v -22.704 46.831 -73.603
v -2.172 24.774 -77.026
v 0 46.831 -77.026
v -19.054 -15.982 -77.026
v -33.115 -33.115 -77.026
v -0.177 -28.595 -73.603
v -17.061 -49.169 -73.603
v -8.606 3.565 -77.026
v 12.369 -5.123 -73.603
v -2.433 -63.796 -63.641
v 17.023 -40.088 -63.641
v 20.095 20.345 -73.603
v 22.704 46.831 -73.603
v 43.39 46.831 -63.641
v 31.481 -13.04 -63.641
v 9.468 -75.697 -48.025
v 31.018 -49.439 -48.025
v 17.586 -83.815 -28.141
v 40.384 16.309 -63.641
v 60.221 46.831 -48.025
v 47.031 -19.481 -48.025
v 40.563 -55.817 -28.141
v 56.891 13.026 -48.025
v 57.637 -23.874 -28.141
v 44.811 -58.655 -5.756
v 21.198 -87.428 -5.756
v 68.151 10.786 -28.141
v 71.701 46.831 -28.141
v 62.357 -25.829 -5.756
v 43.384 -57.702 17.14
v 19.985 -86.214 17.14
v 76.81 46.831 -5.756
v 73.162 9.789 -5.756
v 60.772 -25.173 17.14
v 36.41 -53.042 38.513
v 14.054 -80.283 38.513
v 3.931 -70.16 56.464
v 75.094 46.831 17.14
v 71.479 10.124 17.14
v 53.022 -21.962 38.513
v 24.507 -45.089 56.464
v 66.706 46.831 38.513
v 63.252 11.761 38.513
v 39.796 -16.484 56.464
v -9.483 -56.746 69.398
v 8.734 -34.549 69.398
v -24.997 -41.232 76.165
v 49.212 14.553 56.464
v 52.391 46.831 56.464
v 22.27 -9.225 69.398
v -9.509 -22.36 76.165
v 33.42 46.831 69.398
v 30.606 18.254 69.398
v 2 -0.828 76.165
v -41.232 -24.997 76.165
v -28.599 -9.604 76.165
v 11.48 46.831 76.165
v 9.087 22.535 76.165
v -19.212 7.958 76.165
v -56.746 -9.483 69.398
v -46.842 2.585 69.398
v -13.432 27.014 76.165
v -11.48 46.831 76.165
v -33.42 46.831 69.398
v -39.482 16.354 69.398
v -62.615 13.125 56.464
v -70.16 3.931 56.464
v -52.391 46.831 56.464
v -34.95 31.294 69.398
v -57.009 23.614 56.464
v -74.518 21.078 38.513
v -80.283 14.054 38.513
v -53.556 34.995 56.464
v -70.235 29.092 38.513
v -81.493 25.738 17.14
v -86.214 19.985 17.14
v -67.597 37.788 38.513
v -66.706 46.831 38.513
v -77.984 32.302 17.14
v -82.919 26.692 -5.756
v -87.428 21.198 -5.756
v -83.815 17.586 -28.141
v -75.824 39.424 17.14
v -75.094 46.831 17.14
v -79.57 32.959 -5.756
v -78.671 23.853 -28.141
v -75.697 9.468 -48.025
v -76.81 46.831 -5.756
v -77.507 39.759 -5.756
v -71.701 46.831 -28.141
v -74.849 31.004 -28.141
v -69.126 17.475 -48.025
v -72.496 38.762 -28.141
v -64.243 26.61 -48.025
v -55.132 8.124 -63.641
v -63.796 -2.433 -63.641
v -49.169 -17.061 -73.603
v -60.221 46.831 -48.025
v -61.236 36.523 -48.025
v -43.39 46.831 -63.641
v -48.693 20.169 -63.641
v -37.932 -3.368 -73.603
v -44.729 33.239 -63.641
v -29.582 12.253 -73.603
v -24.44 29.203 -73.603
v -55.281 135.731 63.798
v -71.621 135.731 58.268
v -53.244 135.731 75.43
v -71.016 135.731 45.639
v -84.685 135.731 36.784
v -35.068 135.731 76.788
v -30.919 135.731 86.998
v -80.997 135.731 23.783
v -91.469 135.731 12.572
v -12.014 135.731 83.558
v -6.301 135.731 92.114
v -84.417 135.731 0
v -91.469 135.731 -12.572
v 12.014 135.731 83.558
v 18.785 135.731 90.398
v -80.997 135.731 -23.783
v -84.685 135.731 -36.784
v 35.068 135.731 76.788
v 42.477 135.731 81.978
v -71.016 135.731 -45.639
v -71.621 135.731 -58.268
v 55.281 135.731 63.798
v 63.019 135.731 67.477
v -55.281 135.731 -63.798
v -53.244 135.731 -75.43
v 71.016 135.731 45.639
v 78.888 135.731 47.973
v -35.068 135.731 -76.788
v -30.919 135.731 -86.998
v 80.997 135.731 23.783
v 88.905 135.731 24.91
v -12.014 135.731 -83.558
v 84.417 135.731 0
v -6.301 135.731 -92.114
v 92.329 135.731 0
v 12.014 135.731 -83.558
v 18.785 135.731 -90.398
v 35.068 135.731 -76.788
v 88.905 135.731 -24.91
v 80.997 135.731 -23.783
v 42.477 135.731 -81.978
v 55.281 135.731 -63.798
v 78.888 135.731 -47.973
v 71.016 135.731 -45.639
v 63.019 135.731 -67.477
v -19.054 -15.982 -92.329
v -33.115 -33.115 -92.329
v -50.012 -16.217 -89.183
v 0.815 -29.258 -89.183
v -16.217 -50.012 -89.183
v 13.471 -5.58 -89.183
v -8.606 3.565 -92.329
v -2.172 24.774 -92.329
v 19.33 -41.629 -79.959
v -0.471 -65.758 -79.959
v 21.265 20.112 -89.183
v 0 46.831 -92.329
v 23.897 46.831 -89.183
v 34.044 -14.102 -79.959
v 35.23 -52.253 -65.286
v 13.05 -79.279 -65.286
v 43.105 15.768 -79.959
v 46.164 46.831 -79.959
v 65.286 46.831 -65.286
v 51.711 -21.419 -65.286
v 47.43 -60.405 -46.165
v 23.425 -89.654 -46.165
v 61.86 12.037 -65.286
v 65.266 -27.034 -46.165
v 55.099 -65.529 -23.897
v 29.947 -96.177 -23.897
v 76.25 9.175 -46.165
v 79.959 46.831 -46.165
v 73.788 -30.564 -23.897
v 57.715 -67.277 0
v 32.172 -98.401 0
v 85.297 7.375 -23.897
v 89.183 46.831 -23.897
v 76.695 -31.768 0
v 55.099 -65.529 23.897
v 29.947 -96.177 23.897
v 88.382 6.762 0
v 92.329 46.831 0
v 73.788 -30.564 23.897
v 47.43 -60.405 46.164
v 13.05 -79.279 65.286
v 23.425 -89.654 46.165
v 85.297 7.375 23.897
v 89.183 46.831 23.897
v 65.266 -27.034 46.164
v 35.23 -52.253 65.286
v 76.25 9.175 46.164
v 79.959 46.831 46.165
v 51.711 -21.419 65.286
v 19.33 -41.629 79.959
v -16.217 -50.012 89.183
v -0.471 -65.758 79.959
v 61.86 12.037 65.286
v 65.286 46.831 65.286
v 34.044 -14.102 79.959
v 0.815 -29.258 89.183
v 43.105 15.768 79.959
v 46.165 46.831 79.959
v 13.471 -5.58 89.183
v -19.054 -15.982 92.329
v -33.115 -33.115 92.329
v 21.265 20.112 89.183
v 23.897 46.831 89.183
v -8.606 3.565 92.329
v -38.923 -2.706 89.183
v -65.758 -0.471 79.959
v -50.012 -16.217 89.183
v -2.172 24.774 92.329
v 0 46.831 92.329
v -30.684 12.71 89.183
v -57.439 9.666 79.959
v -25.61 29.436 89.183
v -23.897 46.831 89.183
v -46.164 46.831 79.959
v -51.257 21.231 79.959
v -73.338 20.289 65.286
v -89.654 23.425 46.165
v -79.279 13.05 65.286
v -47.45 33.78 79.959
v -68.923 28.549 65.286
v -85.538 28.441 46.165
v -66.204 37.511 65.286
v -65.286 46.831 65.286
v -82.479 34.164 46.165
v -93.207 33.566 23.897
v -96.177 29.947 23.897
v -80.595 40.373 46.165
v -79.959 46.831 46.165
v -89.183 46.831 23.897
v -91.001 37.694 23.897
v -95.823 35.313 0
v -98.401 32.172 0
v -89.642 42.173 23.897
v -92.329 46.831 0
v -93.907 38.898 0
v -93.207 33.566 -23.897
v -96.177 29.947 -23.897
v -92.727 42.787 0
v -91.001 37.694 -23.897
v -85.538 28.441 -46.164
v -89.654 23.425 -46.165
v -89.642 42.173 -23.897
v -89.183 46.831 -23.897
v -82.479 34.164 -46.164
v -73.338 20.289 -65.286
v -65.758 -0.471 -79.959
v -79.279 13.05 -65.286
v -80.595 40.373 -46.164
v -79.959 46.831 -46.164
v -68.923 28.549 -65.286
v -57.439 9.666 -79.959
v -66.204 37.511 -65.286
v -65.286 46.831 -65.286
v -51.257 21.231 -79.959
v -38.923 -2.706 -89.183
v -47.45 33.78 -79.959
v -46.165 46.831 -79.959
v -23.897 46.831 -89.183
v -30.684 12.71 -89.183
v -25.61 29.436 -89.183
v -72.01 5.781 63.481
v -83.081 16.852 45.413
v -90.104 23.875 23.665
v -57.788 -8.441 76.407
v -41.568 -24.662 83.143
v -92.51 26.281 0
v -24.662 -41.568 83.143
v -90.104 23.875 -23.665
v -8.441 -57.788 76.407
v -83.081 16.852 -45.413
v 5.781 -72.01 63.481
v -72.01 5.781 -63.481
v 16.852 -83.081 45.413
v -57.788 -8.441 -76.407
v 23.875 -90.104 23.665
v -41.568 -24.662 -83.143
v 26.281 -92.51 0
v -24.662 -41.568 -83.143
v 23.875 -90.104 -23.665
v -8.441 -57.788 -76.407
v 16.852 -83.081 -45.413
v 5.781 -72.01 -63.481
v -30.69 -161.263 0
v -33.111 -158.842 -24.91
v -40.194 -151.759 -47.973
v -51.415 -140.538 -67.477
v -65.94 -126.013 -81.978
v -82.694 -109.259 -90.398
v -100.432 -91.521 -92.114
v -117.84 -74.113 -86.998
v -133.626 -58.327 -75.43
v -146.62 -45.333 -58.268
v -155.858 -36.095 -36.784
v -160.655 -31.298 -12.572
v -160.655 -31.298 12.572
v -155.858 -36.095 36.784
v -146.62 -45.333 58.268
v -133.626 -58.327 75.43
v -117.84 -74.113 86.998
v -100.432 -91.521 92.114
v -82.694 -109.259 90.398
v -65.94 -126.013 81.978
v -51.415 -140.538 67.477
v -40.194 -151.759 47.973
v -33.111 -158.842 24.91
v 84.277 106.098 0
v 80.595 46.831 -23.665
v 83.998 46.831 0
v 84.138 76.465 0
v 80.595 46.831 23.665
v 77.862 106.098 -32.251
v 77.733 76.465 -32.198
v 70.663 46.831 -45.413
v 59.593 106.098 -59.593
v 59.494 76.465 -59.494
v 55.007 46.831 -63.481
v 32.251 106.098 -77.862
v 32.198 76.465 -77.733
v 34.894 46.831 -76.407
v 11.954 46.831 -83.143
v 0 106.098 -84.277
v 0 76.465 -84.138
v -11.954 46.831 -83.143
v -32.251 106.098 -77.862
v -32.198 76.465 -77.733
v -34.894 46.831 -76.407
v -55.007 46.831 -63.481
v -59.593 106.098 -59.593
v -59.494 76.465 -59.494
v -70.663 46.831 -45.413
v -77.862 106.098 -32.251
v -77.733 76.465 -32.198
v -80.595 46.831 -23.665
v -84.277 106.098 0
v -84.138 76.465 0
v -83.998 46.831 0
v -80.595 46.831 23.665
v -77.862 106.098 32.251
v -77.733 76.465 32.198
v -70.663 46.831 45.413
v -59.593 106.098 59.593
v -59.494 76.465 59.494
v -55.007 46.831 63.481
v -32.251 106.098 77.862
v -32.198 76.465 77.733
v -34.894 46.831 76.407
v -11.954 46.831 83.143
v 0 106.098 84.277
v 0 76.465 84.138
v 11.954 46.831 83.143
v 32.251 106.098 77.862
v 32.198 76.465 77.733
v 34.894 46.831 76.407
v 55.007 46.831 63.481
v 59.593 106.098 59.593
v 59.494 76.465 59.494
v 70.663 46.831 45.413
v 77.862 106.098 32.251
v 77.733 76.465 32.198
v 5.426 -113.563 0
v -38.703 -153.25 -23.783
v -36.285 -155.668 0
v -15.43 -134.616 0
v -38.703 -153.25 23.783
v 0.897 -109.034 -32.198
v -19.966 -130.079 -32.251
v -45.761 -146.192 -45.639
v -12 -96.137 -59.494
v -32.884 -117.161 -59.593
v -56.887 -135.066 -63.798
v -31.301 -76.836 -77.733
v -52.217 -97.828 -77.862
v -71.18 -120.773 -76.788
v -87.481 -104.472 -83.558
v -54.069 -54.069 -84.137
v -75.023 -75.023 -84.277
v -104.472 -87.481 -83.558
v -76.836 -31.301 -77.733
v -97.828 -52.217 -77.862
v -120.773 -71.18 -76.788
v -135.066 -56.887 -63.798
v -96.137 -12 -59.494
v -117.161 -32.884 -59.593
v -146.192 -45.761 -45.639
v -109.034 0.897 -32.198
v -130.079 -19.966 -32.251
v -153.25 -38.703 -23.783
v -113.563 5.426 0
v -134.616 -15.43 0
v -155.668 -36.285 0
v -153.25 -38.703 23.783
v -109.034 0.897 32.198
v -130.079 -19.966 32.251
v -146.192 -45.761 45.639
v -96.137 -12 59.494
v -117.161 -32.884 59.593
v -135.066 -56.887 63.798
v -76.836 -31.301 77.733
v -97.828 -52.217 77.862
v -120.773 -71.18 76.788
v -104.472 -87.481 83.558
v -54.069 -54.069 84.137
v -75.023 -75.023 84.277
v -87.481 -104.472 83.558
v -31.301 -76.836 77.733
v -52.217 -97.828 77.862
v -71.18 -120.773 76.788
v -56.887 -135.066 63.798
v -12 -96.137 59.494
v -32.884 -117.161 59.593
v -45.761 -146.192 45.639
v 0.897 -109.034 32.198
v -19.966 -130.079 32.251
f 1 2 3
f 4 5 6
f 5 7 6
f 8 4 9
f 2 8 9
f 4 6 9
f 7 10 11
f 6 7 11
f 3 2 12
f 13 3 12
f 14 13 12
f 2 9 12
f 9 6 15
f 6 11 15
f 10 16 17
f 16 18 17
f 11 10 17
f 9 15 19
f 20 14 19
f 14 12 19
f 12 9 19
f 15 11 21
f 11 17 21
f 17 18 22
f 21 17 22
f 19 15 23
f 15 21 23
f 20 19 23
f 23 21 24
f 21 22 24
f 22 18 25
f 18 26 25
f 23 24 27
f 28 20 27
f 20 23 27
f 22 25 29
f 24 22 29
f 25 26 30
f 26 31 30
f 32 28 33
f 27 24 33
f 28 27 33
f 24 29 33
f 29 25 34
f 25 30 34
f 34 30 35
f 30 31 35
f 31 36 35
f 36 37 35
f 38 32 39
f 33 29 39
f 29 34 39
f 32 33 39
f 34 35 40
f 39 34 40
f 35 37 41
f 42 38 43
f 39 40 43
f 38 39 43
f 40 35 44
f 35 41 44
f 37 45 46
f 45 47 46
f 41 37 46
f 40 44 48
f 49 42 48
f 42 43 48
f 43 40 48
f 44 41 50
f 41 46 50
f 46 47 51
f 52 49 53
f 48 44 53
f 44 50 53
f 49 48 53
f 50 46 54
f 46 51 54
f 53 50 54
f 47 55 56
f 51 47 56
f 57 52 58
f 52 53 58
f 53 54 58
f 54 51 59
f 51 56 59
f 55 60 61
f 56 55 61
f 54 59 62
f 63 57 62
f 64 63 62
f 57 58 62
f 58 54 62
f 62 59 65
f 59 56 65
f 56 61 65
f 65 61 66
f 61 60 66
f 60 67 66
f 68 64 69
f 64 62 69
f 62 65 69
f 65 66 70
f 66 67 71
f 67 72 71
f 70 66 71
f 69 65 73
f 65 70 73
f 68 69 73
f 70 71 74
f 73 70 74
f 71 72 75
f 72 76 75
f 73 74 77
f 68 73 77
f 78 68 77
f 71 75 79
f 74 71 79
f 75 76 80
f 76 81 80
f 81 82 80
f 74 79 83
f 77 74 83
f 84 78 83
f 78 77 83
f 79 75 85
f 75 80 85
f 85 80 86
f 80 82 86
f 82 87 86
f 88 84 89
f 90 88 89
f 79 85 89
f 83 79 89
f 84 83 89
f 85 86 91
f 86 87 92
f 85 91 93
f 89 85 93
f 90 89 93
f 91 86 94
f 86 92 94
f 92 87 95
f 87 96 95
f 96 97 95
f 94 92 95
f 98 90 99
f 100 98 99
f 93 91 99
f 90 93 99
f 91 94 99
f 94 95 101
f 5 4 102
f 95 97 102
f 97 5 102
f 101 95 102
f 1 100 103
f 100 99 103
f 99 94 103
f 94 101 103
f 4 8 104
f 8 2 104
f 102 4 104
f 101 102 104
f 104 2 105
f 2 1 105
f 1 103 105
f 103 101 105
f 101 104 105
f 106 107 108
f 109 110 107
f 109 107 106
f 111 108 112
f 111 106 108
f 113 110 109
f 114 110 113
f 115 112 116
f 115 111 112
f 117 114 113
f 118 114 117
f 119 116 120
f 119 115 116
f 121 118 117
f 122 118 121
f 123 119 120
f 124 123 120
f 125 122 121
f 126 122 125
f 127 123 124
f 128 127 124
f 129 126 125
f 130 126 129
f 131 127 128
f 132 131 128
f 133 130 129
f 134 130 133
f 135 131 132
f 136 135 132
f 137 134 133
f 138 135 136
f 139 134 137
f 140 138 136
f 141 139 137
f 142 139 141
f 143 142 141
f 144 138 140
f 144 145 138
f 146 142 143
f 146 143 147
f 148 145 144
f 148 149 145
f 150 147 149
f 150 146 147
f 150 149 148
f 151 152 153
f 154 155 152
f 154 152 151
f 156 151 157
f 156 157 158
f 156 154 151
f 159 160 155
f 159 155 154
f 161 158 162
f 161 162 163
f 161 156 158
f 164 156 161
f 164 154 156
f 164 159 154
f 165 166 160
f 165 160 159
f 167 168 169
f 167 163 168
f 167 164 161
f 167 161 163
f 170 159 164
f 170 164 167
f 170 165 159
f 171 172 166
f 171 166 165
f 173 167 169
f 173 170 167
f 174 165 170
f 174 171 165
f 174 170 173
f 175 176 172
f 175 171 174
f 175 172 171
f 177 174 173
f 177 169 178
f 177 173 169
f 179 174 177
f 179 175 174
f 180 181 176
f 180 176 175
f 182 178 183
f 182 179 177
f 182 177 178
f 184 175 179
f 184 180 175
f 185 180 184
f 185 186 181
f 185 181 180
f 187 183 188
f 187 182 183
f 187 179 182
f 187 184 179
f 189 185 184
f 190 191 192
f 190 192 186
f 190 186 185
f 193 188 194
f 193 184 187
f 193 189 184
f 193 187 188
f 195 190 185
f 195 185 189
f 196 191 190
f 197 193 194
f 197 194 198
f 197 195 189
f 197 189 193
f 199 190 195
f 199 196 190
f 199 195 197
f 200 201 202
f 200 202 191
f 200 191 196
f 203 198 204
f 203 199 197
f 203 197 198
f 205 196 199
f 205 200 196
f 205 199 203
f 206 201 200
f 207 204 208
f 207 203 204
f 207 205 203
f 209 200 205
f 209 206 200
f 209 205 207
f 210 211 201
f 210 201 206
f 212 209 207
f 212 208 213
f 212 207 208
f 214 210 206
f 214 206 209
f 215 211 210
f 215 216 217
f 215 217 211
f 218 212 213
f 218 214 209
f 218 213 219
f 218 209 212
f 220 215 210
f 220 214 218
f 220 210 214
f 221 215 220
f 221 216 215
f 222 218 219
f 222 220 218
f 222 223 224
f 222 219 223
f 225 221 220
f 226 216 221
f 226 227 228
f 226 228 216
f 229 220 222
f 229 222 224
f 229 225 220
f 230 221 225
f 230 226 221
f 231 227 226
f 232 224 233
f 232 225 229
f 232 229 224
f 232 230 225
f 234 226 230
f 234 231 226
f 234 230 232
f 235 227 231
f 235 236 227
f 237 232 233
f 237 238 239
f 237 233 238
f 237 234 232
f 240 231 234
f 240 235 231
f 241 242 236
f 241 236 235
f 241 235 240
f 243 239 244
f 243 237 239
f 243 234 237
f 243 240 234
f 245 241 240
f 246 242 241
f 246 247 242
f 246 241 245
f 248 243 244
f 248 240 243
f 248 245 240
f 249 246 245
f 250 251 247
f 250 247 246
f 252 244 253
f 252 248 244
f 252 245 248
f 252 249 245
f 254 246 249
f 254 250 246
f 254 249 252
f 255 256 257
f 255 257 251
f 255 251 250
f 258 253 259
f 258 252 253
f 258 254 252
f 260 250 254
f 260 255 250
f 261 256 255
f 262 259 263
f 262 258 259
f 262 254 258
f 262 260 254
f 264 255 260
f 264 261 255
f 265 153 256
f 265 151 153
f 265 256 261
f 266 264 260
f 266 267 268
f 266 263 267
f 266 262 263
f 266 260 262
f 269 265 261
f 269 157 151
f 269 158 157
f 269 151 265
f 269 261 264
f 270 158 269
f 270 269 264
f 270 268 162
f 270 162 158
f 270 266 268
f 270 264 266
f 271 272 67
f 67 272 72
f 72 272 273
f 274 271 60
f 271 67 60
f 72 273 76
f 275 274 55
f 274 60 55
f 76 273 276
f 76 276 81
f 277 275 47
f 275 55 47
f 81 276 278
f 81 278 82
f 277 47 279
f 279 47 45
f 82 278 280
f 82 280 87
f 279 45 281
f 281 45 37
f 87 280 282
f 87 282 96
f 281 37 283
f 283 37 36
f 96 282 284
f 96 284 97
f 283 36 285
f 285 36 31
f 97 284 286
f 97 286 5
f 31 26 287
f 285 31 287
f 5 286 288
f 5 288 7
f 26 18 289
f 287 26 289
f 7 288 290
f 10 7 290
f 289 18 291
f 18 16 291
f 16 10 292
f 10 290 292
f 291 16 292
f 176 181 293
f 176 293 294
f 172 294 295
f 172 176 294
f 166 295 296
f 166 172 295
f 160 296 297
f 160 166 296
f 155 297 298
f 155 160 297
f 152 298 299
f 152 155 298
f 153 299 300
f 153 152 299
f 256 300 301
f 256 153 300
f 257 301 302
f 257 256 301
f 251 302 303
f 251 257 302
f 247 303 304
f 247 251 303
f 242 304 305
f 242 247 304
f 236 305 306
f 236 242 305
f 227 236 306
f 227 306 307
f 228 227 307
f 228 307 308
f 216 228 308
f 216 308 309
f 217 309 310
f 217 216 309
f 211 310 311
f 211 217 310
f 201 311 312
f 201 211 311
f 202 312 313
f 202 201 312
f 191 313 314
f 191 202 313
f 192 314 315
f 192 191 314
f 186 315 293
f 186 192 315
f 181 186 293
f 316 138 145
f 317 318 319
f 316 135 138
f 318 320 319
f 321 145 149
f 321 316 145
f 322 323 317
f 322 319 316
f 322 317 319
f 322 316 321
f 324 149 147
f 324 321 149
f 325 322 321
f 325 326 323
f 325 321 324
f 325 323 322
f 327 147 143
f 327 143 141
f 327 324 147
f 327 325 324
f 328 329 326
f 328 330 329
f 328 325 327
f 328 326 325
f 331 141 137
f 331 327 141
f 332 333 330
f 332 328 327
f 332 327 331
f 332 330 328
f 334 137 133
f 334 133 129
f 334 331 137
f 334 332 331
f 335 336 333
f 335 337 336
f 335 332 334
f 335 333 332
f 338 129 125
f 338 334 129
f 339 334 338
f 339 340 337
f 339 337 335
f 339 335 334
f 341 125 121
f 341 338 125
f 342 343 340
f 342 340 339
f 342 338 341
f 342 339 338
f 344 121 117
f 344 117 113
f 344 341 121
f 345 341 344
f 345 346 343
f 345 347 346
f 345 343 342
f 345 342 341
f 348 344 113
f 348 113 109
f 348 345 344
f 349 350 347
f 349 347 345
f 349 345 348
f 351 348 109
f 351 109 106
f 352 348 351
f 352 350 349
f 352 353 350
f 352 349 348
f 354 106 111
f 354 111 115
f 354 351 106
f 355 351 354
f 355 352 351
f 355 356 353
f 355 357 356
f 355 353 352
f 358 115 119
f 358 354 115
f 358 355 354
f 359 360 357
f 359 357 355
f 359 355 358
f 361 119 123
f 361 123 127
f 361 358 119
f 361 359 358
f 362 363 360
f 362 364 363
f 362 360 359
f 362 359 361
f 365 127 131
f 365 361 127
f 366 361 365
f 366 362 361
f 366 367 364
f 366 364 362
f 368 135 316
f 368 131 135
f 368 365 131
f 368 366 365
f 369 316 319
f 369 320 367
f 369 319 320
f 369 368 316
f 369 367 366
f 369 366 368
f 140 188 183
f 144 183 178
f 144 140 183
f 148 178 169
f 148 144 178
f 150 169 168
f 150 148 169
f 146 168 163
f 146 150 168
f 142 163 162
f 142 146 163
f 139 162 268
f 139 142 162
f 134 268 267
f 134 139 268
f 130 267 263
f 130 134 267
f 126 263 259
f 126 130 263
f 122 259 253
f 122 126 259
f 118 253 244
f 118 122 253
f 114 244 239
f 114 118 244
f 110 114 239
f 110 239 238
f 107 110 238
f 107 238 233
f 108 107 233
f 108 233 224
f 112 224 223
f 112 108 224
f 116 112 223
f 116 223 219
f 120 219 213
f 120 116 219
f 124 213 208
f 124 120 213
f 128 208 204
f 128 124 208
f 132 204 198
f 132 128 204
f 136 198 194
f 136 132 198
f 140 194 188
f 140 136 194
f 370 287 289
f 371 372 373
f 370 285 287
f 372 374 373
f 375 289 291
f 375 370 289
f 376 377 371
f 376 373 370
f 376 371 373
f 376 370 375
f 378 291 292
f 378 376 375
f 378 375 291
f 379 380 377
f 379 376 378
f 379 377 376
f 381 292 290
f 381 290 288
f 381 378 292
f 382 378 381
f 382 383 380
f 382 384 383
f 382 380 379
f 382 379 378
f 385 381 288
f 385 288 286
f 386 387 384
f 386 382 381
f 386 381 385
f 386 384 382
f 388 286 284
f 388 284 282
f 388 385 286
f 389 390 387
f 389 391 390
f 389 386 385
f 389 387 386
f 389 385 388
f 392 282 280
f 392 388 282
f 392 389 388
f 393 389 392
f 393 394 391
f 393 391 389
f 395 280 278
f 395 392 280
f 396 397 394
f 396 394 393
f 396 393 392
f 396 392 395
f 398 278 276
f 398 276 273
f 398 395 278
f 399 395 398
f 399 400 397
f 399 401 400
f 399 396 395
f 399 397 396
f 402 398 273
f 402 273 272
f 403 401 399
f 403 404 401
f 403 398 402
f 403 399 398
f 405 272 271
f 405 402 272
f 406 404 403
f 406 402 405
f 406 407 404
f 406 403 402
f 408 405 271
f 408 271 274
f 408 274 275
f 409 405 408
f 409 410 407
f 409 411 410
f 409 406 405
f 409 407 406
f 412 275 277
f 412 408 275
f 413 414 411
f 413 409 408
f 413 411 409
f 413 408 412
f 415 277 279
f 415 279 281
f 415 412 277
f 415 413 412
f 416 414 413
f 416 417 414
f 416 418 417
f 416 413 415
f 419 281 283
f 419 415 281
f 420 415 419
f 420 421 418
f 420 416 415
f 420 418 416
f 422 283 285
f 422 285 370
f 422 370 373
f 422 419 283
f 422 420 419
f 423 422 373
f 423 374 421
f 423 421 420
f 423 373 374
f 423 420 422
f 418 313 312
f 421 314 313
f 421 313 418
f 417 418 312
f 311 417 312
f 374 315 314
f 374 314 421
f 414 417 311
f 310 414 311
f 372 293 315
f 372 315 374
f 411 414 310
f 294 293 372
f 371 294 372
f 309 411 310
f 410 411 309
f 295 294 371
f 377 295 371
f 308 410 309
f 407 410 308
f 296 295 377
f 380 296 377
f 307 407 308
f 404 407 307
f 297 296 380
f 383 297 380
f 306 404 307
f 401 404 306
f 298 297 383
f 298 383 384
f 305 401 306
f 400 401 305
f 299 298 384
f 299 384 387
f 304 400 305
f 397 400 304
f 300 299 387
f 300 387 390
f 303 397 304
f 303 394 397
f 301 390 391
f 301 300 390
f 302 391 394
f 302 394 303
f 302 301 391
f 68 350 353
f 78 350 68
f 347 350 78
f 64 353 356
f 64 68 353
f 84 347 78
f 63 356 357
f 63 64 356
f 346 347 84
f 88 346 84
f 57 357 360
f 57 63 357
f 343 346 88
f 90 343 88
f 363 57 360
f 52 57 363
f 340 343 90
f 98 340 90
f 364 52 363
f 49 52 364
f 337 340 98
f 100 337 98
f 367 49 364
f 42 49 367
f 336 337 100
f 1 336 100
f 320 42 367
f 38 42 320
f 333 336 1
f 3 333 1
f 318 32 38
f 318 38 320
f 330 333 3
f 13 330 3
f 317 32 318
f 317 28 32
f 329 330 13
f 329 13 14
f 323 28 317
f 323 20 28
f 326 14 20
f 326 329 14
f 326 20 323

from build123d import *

# Parameters (mm, degrees)
SKETCH3_R   = 92.329
SKETCH3_R_2 = 77.0255


with BuildPart() as part:
    # Sketch1 → Revolve1 (revolve)
    with BuildSketch(Plane.XY):
        Polygon((-30.690025294, -161.262949294), (32.171767554, -98.401156447), (26.280719538, -92.510108431), (-36.284724857, -155.668249731), align=None)
    revolve(axis=Axis((-95.976487294, -95.976487294, 0), (0.7071067811865488, 0.7071067811865464, 0)))



with BuildPart() as body_2:
    # Sketch2 → Revolve2 (revolve)
    with BuildSketch(Plane.XY):
        Polygon((84.4169, 135.73125), (83.9978, 46.83125), (92.329, 46.83125), (92.329, 135.73125), align=None)
    revolve(axis=Axis((0, 0, 0), (0, 1, 0)))


with BuildPart() as part_1:
    add(part.part)

    add(body_2.part)  # Sweep1 merges body 2
    # Sweep1: sweep along a path in Sketch4
    with BuildLine(Plane.XY) as sweep1_path:
        ThreePointArc((-33.114694446, -33.114694446), (-8.606228687, 3.564816643), (0, 46.83125))
    # Sketch3 → Sweep1 (sweep)
    with BuildSketch(Plane(origin=(-33.114694446, -33.114694446, 0), x_dir=(0, 0, -1), z_dir=(0.7071067811865486, 0.7071067811865465, 0))):
        Circle(SKETCH3_R)
        Circle(SKETCH3_R_2, mode=Mode.SUBTRACT)
    sweep(path=sweep1_path.line)


solid = part_1.part
